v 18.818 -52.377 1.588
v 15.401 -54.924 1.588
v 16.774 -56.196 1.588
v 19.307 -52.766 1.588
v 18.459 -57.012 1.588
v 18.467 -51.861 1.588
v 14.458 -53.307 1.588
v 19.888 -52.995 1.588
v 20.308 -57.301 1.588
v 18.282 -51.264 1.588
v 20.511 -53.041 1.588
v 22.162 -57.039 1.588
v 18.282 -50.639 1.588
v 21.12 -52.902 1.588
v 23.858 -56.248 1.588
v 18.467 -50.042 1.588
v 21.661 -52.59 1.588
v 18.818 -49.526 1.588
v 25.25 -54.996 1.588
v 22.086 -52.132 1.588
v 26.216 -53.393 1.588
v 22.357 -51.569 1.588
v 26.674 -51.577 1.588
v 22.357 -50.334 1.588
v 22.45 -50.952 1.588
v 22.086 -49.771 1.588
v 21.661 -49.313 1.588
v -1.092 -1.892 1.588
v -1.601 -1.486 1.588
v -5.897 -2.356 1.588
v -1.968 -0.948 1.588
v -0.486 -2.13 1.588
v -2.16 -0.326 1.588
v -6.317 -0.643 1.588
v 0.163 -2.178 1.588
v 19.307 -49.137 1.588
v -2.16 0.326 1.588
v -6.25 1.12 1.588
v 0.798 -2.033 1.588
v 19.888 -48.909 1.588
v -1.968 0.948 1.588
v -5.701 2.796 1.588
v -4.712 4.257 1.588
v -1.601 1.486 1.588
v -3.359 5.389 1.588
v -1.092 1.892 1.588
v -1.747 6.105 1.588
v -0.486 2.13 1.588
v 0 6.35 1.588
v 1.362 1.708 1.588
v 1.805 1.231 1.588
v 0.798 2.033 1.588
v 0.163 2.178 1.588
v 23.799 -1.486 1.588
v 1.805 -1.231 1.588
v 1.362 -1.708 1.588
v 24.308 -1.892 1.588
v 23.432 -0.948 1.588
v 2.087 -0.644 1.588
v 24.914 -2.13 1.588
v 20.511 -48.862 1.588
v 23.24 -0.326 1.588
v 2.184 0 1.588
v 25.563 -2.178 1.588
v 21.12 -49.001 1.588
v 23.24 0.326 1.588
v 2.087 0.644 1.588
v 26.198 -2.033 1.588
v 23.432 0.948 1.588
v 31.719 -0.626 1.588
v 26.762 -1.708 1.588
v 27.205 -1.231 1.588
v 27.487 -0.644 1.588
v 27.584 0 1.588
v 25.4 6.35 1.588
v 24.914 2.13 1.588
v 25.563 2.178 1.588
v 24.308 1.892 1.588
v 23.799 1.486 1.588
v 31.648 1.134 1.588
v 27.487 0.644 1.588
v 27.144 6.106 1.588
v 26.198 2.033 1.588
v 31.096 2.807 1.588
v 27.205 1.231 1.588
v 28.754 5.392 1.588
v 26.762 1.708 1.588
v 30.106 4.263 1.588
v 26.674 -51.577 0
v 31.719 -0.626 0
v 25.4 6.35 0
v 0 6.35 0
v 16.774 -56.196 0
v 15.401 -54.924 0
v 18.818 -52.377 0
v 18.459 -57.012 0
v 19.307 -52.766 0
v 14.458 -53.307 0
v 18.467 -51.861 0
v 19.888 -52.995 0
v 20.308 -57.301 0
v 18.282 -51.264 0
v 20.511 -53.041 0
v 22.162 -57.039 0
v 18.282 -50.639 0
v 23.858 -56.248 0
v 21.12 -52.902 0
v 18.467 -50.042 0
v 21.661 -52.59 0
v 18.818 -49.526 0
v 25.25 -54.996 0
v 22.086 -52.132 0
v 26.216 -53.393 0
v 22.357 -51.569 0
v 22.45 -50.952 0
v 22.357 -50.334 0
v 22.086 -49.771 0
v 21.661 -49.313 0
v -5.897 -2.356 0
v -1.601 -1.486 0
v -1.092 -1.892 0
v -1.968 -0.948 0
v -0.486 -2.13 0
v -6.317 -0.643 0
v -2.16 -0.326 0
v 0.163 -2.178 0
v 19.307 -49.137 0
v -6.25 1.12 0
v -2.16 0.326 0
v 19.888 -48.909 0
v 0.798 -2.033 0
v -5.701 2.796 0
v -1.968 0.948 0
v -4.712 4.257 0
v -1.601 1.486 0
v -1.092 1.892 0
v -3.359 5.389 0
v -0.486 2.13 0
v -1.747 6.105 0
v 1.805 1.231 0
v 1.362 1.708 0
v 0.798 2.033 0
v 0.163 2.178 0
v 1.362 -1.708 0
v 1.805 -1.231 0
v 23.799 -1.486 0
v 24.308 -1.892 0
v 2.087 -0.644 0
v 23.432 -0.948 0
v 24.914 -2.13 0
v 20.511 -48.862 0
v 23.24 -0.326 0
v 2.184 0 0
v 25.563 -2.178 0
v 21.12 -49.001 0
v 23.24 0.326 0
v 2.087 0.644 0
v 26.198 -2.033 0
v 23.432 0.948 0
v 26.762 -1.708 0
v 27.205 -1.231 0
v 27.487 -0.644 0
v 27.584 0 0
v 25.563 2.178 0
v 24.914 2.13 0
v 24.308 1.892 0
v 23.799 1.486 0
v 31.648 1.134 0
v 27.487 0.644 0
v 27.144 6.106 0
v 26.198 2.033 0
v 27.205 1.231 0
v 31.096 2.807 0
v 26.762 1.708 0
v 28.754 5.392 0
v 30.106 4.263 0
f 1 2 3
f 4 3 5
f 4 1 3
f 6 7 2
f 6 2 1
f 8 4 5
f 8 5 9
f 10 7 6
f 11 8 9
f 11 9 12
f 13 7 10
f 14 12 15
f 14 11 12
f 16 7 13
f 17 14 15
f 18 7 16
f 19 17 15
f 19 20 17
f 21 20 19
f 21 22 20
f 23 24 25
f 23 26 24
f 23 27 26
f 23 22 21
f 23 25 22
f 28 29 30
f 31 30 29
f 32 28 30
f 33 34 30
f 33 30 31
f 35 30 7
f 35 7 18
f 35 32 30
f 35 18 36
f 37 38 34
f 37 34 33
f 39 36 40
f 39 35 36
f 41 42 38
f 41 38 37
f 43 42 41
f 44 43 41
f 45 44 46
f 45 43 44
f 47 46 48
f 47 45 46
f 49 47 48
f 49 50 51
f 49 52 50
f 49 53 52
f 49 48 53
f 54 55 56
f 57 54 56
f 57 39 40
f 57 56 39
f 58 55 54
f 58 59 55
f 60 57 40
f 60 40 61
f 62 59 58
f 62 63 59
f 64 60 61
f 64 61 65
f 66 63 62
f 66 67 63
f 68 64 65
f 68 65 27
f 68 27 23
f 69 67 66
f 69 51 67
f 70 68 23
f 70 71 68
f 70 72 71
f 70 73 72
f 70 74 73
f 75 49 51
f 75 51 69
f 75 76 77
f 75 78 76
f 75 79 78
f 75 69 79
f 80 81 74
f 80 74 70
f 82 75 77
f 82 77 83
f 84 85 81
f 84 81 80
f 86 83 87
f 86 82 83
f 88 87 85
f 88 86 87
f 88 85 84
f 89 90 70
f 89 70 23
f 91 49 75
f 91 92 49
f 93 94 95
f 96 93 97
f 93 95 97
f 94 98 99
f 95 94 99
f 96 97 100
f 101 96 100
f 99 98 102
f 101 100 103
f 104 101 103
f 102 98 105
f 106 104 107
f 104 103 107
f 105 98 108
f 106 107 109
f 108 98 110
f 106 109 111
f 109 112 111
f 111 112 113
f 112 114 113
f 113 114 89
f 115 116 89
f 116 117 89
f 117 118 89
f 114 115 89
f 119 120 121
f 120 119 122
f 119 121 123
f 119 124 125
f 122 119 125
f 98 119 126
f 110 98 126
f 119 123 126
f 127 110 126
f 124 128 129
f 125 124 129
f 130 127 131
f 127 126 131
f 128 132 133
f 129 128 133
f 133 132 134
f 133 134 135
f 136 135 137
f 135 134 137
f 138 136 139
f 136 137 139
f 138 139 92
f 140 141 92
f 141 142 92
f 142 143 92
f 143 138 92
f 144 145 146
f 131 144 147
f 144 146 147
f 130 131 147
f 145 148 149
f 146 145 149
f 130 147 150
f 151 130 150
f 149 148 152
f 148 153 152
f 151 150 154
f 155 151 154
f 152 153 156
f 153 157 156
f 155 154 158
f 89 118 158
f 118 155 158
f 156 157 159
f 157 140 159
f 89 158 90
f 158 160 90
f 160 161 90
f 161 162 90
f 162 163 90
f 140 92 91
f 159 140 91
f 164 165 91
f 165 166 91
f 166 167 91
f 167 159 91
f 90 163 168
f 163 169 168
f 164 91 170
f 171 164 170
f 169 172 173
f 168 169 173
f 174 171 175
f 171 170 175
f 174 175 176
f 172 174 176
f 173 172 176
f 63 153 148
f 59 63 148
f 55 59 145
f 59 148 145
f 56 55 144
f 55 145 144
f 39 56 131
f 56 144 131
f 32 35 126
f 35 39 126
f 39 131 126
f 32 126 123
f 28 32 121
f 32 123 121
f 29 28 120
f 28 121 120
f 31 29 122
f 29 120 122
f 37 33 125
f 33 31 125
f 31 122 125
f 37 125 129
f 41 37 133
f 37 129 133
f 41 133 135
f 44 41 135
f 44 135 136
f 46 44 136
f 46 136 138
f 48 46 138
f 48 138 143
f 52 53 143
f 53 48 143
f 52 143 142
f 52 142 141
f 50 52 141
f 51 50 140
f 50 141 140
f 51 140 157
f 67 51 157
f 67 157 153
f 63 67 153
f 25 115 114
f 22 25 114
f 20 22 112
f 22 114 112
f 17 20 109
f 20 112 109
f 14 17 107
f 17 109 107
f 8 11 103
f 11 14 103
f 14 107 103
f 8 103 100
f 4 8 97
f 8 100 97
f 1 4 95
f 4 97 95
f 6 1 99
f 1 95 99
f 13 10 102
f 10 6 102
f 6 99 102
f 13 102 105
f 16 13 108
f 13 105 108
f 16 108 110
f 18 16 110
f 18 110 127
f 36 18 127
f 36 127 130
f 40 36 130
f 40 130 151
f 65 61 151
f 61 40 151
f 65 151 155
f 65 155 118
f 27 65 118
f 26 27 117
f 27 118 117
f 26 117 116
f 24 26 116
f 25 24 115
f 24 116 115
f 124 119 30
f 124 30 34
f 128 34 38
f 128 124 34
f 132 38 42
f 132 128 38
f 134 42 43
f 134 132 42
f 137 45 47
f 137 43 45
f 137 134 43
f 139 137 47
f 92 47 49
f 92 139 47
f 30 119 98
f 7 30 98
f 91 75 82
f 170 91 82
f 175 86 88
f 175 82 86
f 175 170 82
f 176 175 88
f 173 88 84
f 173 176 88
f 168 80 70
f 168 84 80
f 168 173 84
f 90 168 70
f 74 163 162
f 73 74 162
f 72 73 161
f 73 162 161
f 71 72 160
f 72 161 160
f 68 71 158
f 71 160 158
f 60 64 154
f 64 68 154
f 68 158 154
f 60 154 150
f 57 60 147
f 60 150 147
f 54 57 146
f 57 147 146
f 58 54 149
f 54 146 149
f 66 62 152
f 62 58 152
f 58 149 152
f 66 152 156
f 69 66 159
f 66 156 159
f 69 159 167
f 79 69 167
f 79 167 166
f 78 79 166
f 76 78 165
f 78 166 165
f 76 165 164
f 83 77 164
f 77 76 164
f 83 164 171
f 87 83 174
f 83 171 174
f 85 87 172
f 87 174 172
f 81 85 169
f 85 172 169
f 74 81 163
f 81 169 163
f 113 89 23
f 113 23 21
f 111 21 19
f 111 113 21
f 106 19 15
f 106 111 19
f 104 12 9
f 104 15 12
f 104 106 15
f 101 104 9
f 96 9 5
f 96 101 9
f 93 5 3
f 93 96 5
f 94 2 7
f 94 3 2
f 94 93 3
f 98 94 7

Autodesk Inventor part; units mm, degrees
ref_plane "YZ Plane" through (0, 0, 0) normal (1, 0, 0) x (0, 1, 0)
ref_plane "XZ Plane" through (0, 0, 0) normal (0, 1, 0) x (-1, 0, 0)
ref_plane "XY Plane" through (0, 0, 0) normal (0, 0, 1) x (1, 0, 0)
sketch "main" plane through (0, 0, 0) normal (0, 0, 1) x (1, 0, 0)
  circle A0 centre (11.6396, 18.419) radius 2.1844
  circle A1 centre (-13.7604, 18.419) radius 2.1844
  arc A2 (-13.7604, 24.769) -> (-19.6572, 16.0633) centre (-13.7604, 18.419) ccw
  arc A3 (17.9587, 17.7933) -> (11.6396, 24.769) centre (11.6396, 18.419) ccw
  line L0 (-19.6572, 16.0633) -> (0.6972, -34.8883)
  line L1 (17.9587, 17.7933) -> (12.9132, -33.1583)
  line L2 (-13.7604, 24.769) -> (11.6396, 24.769)
  circle A4 centre (6.5941, -32.5326) radius 2.0955
  arc A5 (0.6972, -34.8883) -> (12.9132, -33.1583) centre (6.5941, -32.5326) ccw
  point P0 (1.7688, 7.28)
  dimension "d0" = 12.7
  dimension "d1" = 12.7
  dimension "d2" = 12.7
  dimension "d5" = 4.191
sketch "Sketch1" plane through (0, 0, 0) normal (0, 0, 1) x (1, 0, 0)
  circle A0 centre (25.4, 0) radius 2.1844
  circle A1 centre (0, 0) radius 2.1844
  arc A2 (0, 6.35) -> (-5.8969, -2.3557) centre (0, 0) ccw
  arc A3 (31.7191, -0.6258) -> (25.4, 6.35) centre (25.4, 0) ccw
  line L0 (-5.8969, -2.3557) -> (14.4576, -53.3073)
  line L1 (31.7191, -0.6258) -> (26.6735, -51.5774)
  line L2 (0, 6.35) -> (25.4, 6.35)
  circle A4 centre (20.3545, -50.9516) radius 2.0955
  arc A5 (14.4576, -53.3073) -> (26.6735, -51.5774) centre (20.3545, -50.9516) ccw
extrude "Extrusion1" add sketch "Sketch1" along normal blind 1.5875
properties part number "vertical_wing_gusset" material "Acetal Resin, White"
